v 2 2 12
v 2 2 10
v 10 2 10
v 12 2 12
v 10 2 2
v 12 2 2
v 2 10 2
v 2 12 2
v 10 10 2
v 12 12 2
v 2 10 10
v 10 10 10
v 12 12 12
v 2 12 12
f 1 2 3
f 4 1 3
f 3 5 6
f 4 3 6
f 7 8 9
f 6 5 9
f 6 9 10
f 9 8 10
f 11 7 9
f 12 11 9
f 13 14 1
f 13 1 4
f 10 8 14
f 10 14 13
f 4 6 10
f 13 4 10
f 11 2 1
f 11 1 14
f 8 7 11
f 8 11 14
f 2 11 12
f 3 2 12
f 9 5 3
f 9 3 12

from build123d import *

# Parameters (mm, degrees)
BOX_W        = 10
BOX_H        = 10
BOX_DEPTH    = 10
BOX001_W     = 10
BOX001_H     = 10
BOX001_DEPTH = 10


with BuildPart() as cub_base:
    # Box → Box (new body)
    with BuildSketch(Plane.XY):
        with Locations((5, 5)):
            Rectangle(BOX_W, BOX_H)
    extrude(amount=BOX_DEPTH)


with BuildPart() as cut:
    # Box001 → Box001 (new body)
    with BuildSketch(Plane(origin=(2, 2, 2), x_dir=(1, 0, 0), z_dir=(0, 0, 1))):
        with Locations((5, 5)):
            Rectangle(BOX001_W, BOX001_H)
    extrude(amount=BOX001_DEPTH)

    # Cut: cut Cub-Base
    add(cub_base.part, mode=Mode.SUBTRACT)


solid = cut.part
